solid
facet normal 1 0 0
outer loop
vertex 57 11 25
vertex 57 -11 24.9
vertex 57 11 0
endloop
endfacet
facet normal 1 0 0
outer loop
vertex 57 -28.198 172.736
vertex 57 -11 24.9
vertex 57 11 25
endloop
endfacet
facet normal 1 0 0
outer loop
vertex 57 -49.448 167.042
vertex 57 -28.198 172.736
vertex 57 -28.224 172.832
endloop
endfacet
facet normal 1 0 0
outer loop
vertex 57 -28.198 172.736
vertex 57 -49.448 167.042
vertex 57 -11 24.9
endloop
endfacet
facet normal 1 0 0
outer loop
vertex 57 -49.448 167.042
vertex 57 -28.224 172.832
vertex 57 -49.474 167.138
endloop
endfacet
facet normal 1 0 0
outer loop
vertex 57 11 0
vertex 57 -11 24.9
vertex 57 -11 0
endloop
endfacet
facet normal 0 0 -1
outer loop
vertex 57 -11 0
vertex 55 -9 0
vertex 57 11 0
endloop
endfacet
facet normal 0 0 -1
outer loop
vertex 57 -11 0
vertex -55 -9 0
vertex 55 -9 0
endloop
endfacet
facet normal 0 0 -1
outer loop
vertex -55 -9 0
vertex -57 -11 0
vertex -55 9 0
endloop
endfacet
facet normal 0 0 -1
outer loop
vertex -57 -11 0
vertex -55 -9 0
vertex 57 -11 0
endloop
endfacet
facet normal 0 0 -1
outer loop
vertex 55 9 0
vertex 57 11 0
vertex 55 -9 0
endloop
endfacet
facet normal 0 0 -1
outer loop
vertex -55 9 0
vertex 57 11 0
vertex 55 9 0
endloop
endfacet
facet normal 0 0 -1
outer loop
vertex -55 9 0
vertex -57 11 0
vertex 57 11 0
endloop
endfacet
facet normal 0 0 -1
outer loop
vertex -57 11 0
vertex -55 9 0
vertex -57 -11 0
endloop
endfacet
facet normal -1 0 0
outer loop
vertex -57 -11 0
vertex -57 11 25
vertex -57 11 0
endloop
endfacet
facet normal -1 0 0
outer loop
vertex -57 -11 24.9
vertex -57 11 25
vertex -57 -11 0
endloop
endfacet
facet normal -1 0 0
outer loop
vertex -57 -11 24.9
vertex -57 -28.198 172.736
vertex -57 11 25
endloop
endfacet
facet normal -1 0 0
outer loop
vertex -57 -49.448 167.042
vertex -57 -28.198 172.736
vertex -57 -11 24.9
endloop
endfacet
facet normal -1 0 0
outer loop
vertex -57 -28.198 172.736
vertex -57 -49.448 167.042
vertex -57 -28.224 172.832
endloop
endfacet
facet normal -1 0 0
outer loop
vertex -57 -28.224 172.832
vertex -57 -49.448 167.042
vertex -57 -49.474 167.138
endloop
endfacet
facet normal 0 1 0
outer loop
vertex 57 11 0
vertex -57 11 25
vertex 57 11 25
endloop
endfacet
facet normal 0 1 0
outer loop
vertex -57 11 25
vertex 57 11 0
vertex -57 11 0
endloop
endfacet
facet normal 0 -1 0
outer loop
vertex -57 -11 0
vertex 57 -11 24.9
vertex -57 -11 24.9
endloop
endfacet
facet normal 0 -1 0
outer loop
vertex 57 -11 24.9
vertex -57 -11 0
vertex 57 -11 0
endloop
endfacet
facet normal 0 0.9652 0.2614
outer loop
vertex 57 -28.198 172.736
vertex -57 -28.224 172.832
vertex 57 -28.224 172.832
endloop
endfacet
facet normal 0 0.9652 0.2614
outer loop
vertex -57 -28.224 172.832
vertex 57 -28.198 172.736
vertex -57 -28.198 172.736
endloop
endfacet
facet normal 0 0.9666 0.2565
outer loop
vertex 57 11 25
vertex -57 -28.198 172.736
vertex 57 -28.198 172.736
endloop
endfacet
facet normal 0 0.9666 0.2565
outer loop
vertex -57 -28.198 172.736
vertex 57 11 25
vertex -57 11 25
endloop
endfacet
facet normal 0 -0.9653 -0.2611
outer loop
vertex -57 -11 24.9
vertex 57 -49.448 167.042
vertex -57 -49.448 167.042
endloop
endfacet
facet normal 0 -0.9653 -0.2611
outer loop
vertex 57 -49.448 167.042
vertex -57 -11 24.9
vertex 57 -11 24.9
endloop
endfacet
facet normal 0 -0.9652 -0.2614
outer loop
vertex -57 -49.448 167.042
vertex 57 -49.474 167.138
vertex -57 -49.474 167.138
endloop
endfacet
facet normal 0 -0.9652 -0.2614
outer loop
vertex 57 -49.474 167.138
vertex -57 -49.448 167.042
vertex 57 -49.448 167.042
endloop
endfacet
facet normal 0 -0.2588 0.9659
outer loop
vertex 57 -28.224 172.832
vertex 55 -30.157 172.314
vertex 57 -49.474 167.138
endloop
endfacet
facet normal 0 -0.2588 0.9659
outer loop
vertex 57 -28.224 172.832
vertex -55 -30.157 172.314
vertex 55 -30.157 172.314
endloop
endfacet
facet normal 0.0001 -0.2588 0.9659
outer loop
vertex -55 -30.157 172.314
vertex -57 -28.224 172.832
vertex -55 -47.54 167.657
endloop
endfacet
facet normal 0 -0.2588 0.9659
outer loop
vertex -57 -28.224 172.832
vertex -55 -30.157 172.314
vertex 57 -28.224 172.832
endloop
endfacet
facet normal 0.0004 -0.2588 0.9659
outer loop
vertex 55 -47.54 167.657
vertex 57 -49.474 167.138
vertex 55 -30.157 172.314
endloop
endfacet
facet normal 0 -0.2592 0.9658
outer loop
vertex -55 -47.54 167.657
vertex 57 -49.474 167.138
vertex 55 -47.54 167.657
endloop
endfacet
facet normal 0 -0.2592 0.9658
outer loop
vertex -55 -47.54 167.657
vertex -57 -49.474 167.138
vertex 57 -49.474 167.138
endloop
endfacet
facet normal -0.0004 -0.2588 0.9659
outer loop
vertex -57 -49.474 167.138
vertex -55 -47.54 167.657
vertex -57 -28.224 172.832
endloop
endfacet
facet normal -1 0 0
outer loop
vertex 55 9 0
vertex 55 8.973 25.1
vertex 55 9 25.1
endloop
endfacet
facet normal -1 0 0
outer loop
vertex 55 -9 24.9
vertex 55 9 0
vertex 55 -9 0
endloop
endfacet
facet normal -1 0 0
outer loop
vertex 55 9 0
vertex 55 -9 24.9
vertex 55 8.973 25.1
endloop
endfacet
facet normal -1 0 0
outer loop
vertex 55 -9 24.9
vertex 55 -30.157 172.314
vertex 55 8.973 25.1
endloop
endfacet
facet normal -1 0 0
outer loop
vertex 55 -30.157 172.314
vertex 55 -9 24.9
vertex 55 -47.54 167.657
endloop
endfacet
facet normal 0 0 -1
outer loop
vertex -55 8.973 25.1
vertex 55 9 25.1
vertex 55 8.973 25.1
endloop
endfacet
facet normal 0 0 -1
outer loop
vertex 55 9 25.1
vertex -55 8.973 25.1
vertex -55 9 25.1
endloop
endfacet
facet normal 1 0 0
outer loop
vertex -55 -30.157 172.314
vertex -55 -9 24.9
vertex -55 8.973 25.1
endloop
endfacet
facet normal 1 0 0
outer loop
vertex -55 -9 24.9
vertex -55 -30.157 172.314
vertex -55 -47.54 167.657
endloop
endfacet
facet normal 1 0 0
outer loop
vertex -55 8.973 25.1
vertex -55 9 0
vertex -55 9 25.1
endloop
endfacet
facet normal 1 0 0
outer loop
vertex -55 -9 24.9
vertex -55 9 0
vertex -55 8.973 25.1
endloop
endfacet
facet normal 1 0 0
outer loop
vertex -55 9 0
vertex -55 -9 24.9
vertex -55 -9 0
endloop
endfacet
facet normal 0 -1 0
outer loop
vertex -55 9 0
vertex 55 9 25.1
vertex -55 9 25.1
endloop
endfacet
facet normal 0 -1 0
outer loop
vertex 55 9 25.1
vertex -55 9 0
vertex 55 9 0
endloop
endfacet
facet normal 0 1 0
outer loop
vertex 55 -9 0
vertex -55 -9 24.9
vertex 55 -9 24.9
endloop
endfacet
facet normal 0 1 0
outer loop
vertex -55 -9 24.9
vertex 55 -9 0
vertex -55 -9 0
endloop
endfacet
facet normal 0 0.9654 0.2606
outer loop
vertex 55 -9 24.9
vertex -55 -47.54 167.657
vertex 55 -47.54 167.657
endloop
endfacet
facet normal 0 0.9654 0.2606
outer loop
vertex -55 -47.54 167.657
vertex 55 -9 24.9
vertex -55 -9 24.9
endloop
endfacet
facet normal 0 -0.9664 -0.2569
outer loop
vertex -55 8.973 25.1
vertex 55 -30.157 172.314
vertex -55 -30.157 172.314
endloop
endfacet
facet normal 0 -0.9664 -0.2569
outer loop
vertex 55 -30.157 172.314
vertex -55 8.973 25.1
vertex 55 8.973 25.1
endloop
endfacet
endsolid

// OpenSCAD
// 2015-2025 Ford F-150 Under-Seat Floor Vent Extender
// Parametric configuration

/* [Dimensions] */
// OUTER width of the factory under-seat vent (measure your truck)
vent_od_width = 110.0;

// OUTER height of the factory under-seat vent
vent_od_height = 18.0;

// How far the adapter slides over the factory vent
sleeve_depth = 25.0;

// Wall thickness of the printed part
wall_thickness = 2.0;

// How far the duct extends backward (150mm = 6", 225mm = 9")
extension_len = 150.0;

// Angle upward to clear thick rubber floor mats
lift_angle = 15.0;

/* [Hidden] */
$fn = 60;

module floor_extender() {
    difference() {
        // --- OUTER SHELL ---
        union() {
            // 1. The straight sleeve (slides OVER the factory vent)
            translate([-vent_od_width/2 - wall_thickness, -vent_od_height/2 - wall_thickness, 0])
                cube([vent_od_width + 2*wall_thickness, vent_od_height + 2*wall_thickness, sleeve_depth]);

            // 2. The extended duct (angled upward)
            hull() {
                translate([-vent_od_width/2 - wall_thickness, -vent_od_height/2 - wall_thickness, sleeve_depth - 0.1])
                    cube([vent_od_width + 2*wall_thickness, vent_od_height + 2*wall_thickness, 0.1]);

                translate([0, 0, sleeve_depth])
                    rotate([lift_angle, 0, 0])
                    translate([-vent_od_width/2 - wall_thickness, -vent_od_height/2 - wall_thickness, extension_len])
                    cube([vent_od_width + 2*wall_thickness, vent_od_height + 2*wall_thickness, 0.1]);
            }
        }

        // --- INNER SHELL SUBTRACTION (Hollows it out) ---
        union() {
            // 3. Hollow out the straight sleeve (matches factory vent OD)
            translate([-vent_od_width/2, -vent_od_height/2, -1])
                cube([vent_od_width, vent_od_height, sleeve_depth + 1.1]);

            // 4. Hollow out the extended duct
            hull() {
                translate([-vent_od_width/2, -vent_od_height/2, sleeve_depth - 0.1])
                    cube([vent_od_width, vent_od_height, 0.1]);

                translate([0, 0, sleeve_depth])
                    rotate([lift_angle, 0, 0])
                    translate([-vent_od_width/2, -vent_od_height/2, extension_len + 1])
                    cube([vent_od_width, vent_od_height, 0.1]);
            }
        }
    }
}

// Generate the part (Standing vertically on the sleeve opening)
floor_extender();
